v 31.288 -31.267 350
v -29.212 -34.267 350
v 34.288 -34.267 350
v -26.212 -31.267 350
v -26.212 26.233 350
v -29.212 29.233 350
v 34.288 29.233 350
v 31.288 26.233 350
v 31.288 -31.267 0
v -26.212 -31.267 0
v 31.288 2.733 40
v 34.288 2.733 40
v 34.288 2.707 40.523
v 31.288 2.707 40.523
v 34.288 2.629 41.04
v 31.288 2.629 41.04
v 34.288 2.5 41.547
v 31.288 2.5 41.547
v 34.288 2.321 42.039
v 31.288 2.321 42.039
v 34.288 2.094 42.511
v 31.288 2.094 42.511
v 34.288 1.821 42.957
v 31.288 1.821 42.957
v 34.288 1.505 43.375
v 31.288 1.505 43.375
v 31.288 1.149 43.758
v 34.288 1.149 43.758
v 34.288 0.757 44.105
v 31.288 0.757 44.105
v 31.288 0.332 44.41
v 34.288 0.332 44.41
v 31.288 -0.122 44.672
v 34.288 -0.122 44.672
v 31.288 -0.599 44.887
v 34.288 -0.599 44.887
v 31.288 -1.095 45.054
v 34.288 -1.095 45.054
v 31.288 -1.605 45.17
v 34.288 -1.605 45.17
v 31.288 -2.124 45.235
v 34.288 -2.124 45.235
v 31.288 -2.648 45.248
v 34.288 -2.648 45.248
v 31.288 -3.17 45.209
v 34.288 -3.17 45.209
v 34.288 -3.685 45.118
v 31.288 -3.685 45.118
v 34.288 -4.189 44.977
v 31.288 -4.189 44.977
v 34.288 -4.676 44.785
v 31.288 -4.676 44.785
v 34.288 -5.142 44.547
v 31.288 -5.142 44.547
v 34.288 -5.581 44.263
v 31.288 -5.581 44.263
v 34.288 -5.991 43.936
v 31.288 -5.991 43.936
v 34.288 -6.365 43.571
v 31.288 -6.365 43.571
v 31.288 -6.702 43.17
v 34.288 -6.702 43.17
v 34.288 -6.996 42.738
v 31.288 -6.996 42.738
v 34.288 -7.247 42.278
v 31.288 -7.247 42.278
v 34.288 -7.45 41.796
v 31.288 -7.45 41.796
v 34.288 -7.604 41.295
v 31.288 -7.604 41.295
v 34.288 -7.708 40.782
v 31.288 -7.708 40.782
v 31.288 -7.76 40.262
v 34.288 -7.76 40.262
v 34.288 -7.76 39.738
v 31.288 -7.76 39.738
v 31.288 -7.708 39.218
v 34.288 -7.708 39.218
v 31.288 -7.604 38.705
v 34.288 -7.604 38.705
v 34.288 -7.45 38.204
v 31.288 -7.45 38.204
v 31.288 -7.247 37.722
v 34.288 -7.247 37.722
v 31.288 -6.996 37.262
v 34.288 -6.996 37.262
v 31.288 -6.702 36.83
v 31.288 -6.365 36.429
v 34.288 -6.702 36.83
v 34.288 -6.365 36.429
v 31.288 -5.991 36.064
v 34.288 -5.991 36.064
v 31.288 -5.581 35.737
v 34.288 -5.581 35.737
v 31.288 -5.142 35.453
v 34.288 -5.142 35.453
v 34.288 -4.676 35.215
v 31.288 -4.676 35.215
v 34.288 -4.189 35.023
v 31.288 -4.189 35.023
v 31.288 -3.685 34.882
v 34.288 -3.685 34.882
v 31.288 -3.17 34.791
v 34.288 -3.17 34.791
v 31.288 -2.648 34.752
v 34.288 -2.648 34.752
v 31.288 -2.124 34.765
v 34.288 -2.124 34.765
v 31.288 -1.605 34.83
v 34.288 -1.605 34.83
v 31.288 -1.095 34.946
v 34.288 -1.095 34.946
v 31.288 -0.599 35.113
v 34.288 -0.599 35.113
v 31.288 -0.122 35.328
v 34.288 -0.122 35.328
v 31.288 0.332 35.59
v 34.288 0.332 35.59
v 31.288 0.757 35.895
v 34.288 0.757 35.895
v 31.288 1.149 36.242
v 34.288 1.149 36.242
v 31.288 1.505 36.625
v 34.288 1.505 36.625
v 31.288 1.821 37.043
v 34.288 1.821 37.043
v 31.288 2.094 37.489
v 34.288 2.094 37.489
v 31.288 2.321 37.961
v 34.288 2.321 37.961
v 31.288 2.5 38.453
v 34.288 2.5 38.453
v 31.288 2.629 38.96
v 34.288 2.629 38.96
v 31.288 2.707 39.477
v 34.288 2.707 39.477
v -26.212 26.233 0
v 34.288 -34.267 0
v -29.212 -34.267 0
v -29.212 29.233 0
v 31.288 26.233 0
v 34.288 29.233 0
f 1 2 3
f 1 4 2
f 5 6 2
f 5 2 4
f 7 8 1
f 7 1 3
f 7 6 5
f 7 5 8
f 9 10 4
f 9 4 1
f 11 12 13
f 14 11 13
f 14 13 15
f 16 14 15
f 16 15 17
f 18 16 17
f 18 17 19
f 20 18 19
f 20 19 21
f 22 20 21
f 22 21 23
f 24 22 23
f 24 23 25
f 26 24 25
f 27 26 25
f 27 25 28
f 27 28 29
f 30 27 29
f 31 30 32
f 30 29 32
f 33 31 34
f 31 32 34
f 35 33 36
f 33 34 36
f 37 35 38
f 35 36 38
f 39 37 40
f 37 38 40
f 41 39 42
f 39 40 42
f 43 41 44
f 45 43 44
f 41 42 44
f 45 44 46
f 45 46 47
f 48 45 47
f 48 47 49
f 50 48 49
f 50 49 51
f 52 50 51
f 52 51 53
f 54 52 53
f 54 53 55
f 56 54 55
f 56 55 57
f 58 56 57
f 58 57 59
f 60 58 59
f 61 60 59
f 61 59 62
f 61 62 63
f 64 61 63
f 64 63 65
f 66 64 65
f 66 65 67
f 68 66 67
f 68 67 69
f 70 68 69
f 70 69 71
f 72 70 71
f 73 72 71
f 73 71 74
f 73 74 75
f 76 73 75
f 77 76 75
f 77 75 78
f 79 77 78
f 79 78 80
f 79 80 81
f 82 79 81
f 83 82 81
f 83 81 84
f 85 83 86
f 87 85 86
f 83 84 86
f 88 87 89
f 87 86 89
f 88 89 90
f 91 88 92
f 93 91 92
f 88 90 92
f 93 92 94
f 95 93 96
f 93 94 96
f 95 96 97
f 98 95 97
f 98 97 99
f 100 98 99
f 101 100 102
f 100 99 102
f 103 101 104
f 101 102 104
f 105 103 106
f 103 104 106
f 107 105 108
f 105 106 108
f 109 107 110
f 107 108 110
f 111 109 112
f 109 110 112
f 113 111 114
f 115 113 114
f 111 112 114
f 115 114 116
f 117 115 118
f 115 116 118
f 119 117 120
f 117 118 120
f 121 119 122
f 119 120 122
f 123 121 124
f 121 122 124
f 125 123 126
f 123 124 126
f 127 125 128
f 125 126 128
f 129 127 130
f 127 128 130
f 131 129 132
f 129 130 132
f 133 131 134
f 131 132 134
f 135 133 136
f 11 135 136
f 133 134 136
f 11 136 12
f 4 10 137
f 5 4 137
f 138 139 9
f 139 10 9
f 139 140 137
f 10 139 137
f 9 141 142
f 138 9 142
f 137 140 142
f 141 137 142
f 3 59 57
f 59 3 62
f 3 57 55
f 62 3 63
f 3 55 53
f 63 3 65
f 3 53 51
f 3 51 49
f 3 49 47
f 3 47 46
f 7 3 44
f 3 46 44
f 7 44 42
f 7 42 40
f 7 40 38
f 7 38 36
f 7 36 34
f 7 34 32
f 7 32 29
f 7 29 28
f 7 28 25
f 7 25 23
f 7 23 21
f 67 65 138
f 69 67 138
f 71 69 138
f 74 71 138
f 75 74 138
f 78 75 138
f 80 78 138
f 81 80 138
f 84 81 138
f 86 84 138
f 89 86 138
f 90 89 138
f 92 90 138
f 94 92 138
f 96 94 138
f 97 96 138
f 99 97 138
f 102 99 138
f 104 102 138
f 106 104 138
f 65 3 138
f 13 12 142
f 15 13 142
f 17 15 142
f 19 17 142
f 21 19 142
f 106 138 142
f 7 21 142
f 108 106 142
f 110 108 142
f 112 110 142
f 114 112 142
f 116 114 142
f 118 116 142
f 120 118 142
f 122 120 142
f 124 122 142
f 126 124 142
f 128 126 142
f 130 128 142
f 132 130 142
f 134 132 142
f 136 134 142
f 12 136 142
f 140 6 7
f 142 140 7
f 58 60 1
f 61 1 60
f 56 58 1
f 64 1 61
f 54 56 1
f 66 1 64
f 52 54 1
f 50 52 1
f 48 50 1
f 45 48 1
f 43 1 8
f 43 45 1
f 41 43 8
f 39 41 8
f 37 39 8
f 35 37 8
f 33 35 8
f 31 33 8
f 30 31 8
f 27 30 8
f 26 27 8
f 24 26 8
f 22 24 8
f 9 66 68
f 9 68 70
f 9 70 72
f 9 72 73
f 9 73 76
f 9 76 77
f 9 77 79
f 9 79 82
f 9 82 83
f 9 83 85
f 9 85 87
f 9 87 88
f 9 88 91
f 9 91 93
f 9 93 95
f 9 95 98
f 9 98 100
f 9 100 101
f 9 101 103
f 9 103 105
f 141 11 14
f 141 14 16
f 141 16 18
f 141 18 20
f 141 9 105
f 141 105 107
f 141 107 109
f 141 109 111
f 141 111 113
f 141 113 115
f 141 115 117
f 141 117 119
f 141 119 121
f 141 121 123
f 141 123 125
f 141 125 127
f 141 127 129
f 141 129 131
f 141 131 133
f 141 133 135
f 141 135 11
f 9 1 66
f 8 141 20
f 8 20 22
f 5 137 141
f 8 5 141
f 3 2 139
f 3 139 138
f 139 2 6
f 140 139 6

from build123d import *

# Parameters (mm, degrees)
F0_W     = 63.5
F0_H     = 63.5
F0_W_2   = 57.5
F0_H_2   = 57.5
F1_DEPTH = 350
F2_R     = 5.25
F3_DEPTH = 10


with BuildPart() as f1:
    # F0 (on Top) → F1 (new body)
    with BuildSketch(Plane.XY):
        with Locations((2.538389, -2.516717)):
            Rectangle(F0_W, F0_H)
        with Locations((2.538389, -2.516717)):
            Rectangle(F0_W_2, F0_H_2, mode=Mode.SUBTRACT)
    extrude(amount=F1_DEPTH)

    # F2 (on face) → F3 (cut)
    with BuildSketch(Plane.YZ.offset(34.288389)):
        with Locations((-2.516717, 40)):
            Circle(F2_R)
    extrude(amount=-F3_DEPTH, mode=Mode.SUBTRACT)


solid = f1.part
